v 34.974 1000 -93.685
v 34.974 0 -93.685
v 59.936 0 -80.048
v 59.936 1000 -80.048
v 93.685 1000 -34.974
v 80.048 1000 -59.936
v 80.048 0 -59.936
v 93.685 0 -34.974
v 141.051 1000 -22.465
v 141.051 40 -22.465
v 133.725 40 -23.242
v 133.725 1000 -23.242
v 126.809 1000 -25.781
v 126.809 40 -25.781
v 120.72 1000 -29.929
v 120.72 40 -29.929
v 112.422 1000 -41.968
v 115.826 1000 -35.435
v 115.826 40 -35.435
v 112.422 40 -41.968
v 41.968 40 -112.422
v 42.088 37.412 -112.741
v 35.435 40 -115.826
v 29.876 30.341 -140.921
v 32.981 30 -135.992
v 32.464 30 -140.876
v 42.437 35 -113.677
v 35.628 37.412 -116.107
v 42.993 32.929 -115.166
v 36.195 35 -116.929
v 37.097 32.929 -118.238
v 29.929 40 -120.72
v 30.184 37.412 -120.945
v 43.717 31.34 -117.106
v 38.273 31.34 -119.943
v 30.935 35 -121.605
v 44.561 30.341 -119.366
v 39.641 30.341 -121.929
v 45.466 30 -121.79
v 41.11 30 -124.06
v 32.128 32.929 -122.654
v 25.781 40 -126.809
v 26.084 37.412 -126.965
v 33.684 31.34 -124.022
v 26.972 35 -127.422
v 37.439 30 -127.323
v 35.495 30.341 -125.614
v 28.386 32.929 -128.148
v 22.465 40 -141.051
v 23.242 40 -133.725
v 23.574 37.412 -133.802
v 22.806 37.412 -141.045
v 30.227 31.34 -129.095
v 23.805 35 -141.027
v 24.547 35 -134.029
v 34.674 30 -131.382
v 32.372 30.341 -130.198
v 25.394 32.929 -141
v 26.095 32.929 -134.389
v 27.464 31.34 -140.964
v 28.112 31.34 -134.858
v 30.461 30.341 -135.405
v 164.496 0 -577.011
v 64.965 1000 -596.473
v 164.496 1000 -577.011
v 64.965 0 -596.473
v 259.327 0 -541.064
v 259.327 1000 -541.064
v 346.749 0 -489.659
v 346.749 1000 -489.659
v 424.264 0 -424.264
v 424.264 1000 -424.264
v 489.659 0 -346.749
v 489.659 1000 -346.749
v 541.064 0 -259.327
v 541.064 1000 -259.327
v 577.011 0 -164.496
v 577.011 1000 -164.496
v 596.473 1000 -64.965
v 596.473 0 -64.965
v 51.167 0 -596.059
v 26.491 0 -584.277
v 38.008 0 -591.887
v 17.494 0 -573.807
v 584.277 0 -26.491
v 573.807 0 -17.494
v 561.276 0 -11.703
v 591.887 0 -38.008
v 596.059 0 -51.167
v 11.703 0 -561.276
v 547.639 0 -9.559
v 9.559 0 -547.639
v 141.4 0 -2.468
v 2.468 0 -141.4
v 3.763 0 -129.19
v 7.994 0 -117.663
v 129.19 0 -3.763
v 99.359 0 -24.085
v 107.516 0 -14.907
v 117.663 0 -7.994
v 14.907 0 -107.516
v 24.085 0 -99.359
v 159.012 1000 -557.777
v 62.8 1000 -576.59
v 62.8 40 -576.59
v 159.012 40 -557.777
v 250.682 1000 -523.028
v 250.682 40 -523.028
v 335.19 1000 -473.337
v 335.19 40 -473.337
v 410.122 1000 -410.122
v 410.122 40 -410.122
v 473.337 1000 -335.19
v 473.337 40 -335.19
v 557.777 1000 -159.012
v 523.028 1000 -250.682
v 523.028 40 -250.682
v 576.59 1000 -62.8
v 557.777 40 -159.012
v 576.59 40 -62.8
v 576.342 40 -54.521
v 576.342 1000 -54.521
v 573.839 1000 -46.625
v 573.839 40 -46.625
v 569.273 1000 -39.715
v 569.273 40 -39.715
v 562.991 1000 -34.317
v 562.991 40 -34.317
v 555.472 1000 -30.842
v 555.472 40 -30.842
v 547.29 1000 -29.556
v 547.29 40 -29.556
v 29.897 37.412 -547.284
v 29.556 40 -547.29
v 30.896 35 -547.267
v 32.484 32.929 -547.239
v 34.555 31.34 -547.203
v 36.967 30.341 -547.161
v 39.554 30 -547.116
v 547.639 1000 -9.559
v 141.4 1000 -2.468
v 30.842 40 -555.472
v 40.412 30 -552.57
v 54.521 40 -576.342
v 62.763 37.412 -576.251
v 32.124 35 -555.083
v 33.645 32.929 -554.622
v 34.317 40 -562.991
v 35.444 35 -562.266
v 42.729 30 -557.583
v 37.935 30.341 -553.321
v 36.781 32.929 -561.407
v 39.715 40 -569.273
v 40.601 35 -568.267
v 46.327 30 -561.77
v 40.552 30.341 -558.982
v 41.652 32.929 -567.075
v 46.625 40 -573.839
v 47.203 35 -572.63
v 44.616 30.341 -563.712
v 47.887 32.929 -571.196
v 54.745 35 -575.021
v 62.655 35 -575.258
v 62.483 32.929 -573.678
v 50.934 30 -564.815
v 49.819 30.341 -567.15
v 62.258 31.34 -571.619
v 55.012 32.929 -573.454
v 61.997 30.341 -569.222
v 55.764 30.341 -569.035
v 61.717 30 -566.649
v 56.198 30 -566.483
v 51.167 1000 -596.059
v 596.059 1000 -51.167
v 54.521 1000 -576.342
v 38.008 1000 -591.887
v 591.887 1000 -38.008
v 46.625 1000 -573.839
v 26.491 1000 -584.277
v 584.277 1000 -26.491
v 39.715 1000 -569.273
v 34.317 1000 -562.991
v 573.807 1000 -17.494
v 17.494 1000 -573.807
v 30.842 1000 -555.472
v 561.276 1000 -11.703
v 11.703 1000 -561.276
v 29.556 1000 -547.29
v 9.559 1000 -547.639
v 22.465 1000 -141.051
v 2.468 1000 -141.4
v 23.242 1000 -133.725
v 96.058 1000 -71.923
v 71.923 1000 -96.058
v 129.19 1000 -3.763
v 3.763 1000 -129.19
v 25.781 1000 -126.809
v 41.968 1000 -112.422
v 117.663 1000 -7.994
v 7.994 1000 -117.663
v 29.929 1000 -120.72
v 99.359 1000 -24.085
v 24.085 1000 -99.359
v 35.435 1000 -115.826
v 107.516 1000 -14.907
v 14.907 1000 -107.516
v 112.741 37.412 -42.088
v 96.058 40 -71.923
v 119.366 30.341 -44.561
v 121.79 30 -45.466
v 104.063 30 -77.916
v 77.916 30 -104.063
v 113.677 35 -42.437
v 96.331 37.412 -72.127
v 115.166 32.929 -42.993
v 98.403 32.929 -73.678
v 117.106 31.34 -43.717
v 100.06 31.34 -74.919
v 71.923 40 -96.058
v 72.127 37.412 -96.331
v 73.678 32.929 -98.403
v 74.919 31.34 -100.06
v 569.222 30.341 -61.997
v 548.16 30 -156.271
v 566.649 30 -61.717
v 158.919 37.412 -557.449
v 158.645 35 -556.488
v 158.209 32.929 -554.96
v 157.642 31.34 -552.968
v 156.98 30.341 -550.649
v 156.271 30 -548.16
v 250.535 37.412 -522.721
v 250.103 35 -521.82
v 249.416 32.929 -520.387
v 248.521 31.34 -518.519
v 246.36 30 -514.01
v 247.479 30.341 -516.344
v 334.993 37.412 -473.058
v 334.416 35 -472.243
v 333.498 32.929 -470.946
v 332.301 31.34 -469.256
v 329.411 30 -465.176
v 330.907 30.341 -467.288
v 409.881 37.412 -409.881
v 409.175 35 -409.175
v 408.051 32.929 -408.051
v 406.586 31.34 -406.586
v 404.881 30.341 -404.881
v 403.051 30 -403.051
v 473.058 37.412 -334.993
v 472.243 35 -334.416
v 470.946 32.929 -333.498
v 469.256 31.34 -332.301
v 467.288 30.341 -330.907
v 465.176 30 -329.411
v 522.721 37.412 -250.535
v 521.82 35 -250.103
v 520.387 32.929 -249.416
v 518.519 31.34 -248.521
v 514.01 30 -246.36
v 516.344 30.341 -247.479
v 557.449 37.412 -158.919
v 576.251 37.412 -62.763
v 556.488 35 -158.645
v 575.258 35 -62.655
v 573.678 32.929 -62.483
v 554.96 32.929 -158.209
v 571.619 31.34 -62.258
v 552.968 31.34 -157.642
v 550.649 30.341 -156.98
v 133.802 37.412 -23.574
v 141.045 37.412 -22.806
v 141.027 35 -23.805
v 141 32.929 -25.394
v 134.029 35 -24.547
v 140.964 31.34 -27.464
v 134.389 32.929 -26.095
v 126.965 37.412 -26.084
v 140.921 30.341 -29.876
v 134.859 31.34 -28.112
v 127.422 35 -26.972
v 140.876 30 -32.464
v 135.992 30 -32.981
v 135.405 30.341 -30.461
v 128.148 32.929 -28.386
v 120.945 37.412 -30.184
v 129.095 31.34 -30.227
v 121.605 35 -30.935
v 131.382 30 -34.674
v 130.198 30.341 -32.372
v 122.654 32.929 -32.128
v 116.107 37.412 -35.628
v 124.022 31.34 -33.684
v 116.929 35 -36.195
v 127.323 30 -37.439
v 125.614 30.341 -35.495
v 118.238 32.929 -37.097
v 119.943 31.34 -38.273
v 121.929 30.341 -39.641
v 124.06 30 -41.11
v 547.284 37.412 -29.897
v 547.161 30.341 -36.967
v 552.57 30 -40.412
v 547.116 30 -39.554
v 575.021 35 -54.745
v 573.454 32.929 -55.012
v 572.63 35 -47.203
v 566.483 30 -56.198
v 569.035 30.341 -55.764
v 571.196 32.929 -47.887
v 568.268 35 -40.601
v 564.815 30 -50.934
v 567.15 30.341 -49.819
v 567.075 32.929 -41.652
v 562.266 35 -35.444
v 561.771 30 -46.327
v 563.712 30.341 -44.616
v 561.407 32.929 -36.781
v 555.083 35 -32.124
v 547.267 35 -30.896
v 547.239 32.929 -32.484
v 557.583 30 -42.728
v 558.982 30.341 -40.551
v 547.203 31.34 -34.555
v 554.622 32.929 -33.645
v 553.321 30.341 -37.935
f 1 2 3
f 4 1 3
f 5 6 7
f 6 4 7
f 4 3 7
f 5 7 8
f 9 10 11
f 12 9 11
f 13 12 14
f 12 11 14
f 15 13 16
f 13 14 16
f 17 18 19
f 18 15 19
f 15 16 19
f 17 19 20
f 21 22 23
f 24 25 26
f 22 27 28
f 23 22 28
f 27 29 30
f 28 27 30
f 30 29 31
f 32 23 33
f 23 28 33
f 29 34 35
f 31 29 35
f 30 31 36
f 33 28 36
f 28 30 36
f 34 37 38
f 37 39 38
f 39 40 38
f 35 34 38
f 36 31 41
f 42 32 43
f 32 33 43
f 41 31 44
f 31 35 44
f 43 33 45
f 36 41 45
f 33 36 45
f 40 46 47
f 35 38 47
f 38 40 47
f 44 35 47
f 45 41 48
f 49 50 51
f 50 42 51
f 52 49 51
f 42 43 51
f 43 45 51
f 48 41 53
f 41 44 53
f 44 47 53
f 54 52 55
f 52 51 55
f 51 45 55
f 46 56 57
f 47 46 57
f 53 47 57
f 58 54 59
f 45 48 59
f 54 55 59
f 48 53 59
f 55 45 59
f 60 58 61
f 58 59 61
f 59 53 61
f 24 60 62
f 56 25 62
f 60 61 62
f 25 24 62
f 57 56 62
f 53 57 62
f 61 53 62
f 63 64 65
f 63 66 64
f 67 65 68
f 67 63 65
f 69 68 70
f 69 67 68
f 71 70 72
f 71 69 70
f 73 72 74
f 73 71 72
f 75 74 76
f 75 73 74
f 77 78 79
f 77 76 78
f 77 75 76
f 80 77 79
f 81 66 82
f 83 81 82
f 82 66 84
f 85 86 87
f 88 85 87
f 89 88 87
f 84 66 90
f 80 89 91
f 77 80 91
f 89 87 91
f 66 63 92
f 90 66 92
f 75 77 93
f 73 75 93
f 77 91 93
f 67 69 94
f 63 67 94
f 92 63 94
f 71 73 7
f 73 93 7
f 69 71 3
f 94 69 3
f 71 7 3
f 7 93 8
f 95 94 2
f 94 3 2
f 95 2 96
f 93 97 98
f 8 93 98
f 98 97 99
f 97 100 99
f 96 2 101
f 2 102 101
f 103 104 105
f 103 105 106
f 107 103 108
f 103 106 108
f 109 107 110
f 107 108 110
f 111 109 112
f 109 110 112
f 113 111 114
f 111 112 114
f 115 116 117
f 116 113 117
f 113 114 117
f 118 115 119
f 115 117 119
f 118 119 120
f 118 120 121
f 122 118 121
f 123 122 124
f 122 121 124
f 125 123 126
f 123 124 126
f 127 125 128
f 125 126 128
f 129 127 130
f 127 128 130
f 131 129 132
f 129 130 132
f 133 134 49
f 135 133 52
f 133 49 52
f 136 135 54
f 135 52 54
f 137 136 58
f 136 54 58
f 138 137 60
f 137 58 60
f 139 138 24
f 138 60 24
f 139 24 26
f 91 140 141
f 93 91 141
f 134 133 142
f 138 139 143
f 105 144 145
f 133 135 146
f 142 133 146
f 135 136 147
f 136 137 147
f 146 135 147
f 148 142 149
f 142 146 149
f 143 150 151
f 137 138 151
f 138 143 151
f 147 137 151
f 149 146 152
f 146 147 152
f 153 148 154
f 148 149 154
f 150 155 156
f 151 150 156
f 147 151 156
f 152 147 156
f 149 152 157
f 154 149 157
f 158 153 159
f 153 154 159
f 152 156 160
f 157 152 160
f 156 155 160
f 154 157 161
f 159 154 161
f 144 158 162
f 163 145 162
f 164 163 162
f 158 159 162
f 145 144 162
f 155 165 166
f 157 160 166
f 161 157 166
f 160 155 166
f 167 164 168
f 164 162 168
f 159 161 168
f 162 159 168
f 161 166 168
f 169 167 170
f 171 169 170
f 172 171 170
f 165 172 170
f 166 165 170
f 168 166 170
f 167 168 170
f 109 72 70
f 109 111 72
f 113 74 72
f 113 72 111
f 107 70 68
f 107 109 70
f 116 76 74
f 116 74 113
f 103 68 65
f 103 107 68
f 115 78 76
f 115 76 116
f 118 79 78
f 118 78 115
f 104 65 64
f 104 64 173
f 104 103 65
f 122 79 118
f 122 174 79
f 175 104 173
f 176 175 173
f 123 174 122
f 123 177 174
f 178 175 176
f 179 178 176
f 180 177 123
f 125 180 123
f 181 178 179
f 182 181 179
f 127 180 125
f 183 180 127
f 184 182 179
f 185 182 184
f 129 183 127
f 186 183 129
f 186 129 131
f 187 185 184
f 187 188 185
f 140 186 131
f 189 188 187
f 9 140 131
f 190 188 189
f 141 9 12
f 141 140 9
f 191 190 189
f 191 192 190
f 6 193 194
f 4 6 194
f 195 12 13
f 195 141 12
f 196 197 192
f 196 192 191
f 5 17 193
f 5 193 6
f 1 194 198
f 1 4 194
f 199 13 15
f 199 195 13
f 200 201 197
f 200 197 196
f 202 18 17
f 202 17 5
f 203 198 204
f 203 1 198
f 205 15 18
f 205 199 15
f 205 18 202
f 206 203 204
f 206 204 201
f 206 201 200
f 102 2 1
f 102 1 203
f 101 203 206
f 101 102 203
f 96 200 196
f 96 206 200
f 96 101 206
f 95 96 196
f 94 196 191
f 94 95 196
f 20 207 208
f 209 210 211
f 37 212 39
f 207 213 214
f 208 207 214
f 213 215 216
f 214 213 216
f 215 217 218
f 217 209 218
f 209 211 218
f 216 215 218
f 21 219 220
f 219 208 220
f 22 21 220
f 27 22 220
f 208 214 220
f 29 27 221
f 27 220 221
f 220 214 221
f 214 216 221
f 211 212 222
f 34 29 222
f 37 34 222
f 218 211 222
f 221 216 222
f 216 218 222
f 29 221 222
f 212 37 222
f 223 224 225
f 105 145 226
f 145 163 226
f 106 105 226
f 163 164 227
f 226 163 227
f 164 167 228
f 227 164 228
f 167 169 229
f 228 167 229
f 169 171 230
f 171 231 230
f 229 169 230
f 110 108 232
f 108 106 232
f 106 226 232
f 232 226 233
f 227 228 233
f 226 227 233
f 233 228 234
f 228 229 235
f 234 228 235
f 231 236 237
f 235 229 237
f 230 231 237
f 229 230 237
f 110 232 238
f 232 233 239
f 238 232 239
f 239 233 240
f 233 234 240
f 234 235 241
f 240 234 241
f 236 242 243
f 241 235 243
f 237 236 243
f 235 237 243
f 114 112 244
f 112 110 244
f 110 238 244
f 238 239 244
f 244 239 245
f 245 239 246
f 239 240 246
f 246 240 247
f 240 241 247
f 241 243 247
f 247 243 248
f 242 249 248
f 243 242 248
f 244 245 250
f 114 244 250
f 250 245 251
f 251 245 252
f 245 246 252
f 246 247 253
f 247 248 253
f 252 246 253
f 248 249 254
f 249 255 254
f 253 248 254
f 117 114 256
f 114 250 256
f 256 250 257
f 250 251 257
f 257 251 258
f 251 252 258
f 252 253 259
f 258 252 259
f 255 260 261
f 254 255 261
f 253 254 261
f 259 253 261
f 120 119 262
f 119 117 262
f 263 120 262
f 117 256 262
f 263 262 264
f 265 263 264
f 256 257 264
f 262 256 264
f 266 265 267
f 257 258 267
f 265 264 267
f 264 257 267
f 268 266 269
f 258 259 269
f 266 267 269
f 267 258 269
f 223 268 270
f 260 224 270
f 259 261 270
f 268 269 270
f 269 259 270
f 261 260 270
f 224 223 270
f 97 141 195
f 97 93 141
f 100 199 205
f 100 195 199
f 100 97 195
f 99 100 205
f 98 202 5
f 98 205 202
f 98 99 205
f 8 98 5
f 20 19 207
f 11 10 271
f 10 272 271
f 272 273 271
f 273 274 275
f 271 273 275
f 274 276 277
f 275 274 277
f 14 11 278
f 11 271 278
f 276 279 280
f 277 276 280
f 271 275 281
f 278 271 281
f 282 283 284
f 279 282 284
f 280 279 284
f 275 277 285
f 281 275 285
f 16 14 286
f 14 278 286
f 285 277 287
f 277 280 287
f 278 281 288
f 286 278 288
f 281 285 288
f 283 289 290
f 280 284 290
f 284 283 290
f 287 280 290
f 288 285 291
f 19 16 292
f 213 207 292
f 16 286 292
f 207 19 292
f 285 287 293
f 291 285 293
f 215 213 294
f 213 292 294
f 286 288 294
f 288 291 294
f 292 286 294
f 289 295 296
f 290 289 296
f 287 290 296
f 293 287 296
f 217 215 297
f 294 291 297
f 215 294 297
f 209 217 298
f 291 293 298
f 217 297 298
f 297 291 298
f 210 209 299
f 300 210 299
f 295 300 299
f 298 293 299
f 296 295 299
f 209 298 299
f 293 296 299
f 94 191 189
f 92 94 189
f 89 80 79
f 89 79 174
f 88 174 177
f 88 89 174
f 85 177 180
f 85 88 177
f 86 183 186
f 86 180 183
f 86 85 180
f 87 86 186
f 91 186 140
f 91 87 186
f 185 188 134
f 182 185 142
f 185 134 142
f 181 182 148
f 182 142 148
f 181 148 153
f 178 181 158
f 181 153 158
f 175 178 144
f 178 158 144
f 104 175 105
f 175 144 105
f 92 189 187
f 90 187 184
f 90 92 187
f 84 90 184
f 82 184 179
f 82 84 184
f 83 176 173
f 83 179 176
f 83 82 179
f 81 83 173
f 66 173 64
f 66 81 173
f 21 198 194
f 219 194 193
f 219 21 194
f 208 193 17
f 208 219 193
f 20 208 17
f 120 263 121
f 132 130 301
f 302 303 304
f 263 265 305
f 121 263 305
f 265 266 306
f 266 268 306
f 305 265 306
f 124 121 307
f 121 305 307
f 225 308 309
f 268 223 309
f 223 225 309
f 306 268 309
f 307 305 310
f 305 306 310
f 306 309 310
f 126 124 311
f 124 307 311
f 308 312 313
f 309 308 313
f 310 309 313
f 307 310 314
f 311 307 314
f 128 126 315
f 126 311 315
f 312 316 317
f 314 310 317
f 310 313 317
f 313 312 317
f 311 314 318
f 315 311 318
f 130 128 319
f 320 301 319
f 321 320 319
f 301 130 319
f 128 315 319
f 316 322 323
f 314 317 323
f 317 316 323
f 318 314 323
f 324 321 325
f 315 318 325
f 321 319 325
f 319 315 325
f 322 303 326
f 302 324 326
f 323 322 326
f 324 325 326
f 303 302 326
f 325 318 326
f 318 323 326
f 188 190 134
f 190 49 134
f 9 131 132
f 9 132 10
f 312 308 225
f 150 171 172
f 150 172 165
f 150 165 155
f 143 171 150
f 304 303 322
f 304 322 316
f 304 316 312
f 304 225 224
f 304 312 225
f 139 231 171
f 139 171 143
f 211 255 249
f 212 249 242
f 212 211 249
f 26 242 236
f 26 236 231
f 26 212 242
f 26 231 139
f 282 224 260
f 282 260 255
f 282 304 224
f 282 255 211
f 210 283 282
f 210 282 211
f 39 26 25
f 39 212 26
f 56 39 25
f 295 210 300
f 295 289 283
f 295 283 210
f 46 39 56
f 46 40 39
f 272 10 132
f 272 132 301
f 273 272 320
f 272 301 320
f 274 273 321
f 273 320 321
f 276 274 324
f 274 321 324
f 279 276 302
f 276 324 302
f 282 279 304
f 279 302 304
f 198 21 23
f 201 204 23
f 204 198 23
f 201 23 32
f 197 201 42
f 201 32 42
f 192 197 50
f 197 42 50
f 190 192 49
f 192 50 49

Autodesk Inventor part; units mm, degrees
ref_plane "YZ Plane" through (0, 0, 0) normal (1, 0, 0) x (0, 1, 0)
ref_plane "XZ Plane" through (0, 0, 0) normal (0, 1, 0) x (-1, 0, 0)
ref_plane "XY Plane" through (0, 0, 0) normal (0, 0, 1) x (1, 0, 0)
sketch "草图1" plane through (0, 0, 0) normal (0, 1, 0) x (-1, 0, 0)
  circle A0 centre (0, 0) radius 650
  arc A1 (-64.9652, -596.4726) -> (-9.5591, -547.6391) centre (-59.5515, -546.7665) ccw projected
  line L0 (-2.4681, -141.3998) -> (-9.5591, -547.6391) projected
  arc A2 (-2.4681, -141.3998) -> (-34.9737, -93.6848) centre (-52.4605, -140.5272) ccw projected
  arc A3 (-93.6848, -34.9737) -> (-34.9737, -93.6848) centre (0, 0) ccw projected
  arc A4 (-93.6848, -34.9737) -> (-141.3998, -2.4681) centre (-140.5272, -52.4605) ccw projected
  line L1 (-547.6391, -9.5591) -> (-141.3998, -2.4681) projected
  arc A5 (-547.6391, -9.5591) -> (-596.4726, -64.9652) centre (-546.7665, -59.5515) ccw projected
  arc A6 (-596.4726, -64.9652) -> (-64.9652, -596.4726) centre (0, 0) ccw projected
  arc A7 (-64.9652, -596.4726) -> (-9.5591, -547.6391) centre (-59.5515, -546.7665) ccw
  line L2 (-9.5591, -547.6391) -> (-2.4681, -141.3998)
  arc A8 (-2.4681, -141.3998) -> (-34.9737, -93.6848) centre (-52.4605, -140.5272) ccw
  arc A9 (-93.6848, -34.9737) -> (-34.9737, -93.6848) centre (0, 0) ccw
  arc A10 (-93.6848, -34.9737) -> (-141.3998, -2.4681) centre (-140.5272, -52.4605) ccw
  line L3 (-141.3998, -2.4681) -> (-547.6391, -9.5591)
  arc A11 (-547.6391, -9.5591) -> (-596.4726, -64.9652) centre (-546.7665, -59.5515) ccw
  arc A12 (-596.4726, -64.9652) -> (-64.9652, -596.4726) centre (0, 0) ccw
  line L4 (-22.4651, -141.0508) -> (-29.556, -547.2901)
  arc A13 (-62.7997, -576.5901) -> (-29.556, -547.2901) centre (-59.5515, -546.7665) ccw
  arc A14 (-576.5901, -62.7997) -> (-62.7997, -576.5901) centre (0, 0) ccw
  arc A15 (-547.2901, -29.556) -> (-576.5901, -62.7997) centre (-546.7665, -59.5515) ccw
  line L5 (-547.2901, -29.556) -> (-141.0508, -22.4651)
  arc A16 (-112.4218, -41.9684) -> (-141.0508, -22.4651) centre (-140.5272, -52.4605) ccw
  arc A17 (-112.4218, -41.9684) -> (-41.9684, -112.4218) centre (0, 0) ccw
  arc A18 (-22.4651, -141.0508) -> (-41.9684, -112.4218) centre (-52.4605, -140.5272) ccw
  dimension "d0" = 1300
  dimension "d3" = 0
  dimension "d4" = 20
extrude "拉伸2" add sketch "草图1" along normal blind 1000 contours A6 A5 L1 A4 A3 A2 L0 A1
extrude "拉伸3" add sketch "草图1" along normal blind 30 contours L4 A13 A14 A15 L5 A16 A17 A18
fillet "圆角1" radius 10 8 edges at (569.2726, 30, -39.7152) (344.1704, 30, -26.0106) (123.6368, 30, -27.6671) (84.8528, 30, -84.8528) (27.6671, 30, -123.6368) (26.0106, 30, -344.1704) (39.7152, 30, -569.2726) (410.1219, 30, -410.1219)
properties part number "桶"
